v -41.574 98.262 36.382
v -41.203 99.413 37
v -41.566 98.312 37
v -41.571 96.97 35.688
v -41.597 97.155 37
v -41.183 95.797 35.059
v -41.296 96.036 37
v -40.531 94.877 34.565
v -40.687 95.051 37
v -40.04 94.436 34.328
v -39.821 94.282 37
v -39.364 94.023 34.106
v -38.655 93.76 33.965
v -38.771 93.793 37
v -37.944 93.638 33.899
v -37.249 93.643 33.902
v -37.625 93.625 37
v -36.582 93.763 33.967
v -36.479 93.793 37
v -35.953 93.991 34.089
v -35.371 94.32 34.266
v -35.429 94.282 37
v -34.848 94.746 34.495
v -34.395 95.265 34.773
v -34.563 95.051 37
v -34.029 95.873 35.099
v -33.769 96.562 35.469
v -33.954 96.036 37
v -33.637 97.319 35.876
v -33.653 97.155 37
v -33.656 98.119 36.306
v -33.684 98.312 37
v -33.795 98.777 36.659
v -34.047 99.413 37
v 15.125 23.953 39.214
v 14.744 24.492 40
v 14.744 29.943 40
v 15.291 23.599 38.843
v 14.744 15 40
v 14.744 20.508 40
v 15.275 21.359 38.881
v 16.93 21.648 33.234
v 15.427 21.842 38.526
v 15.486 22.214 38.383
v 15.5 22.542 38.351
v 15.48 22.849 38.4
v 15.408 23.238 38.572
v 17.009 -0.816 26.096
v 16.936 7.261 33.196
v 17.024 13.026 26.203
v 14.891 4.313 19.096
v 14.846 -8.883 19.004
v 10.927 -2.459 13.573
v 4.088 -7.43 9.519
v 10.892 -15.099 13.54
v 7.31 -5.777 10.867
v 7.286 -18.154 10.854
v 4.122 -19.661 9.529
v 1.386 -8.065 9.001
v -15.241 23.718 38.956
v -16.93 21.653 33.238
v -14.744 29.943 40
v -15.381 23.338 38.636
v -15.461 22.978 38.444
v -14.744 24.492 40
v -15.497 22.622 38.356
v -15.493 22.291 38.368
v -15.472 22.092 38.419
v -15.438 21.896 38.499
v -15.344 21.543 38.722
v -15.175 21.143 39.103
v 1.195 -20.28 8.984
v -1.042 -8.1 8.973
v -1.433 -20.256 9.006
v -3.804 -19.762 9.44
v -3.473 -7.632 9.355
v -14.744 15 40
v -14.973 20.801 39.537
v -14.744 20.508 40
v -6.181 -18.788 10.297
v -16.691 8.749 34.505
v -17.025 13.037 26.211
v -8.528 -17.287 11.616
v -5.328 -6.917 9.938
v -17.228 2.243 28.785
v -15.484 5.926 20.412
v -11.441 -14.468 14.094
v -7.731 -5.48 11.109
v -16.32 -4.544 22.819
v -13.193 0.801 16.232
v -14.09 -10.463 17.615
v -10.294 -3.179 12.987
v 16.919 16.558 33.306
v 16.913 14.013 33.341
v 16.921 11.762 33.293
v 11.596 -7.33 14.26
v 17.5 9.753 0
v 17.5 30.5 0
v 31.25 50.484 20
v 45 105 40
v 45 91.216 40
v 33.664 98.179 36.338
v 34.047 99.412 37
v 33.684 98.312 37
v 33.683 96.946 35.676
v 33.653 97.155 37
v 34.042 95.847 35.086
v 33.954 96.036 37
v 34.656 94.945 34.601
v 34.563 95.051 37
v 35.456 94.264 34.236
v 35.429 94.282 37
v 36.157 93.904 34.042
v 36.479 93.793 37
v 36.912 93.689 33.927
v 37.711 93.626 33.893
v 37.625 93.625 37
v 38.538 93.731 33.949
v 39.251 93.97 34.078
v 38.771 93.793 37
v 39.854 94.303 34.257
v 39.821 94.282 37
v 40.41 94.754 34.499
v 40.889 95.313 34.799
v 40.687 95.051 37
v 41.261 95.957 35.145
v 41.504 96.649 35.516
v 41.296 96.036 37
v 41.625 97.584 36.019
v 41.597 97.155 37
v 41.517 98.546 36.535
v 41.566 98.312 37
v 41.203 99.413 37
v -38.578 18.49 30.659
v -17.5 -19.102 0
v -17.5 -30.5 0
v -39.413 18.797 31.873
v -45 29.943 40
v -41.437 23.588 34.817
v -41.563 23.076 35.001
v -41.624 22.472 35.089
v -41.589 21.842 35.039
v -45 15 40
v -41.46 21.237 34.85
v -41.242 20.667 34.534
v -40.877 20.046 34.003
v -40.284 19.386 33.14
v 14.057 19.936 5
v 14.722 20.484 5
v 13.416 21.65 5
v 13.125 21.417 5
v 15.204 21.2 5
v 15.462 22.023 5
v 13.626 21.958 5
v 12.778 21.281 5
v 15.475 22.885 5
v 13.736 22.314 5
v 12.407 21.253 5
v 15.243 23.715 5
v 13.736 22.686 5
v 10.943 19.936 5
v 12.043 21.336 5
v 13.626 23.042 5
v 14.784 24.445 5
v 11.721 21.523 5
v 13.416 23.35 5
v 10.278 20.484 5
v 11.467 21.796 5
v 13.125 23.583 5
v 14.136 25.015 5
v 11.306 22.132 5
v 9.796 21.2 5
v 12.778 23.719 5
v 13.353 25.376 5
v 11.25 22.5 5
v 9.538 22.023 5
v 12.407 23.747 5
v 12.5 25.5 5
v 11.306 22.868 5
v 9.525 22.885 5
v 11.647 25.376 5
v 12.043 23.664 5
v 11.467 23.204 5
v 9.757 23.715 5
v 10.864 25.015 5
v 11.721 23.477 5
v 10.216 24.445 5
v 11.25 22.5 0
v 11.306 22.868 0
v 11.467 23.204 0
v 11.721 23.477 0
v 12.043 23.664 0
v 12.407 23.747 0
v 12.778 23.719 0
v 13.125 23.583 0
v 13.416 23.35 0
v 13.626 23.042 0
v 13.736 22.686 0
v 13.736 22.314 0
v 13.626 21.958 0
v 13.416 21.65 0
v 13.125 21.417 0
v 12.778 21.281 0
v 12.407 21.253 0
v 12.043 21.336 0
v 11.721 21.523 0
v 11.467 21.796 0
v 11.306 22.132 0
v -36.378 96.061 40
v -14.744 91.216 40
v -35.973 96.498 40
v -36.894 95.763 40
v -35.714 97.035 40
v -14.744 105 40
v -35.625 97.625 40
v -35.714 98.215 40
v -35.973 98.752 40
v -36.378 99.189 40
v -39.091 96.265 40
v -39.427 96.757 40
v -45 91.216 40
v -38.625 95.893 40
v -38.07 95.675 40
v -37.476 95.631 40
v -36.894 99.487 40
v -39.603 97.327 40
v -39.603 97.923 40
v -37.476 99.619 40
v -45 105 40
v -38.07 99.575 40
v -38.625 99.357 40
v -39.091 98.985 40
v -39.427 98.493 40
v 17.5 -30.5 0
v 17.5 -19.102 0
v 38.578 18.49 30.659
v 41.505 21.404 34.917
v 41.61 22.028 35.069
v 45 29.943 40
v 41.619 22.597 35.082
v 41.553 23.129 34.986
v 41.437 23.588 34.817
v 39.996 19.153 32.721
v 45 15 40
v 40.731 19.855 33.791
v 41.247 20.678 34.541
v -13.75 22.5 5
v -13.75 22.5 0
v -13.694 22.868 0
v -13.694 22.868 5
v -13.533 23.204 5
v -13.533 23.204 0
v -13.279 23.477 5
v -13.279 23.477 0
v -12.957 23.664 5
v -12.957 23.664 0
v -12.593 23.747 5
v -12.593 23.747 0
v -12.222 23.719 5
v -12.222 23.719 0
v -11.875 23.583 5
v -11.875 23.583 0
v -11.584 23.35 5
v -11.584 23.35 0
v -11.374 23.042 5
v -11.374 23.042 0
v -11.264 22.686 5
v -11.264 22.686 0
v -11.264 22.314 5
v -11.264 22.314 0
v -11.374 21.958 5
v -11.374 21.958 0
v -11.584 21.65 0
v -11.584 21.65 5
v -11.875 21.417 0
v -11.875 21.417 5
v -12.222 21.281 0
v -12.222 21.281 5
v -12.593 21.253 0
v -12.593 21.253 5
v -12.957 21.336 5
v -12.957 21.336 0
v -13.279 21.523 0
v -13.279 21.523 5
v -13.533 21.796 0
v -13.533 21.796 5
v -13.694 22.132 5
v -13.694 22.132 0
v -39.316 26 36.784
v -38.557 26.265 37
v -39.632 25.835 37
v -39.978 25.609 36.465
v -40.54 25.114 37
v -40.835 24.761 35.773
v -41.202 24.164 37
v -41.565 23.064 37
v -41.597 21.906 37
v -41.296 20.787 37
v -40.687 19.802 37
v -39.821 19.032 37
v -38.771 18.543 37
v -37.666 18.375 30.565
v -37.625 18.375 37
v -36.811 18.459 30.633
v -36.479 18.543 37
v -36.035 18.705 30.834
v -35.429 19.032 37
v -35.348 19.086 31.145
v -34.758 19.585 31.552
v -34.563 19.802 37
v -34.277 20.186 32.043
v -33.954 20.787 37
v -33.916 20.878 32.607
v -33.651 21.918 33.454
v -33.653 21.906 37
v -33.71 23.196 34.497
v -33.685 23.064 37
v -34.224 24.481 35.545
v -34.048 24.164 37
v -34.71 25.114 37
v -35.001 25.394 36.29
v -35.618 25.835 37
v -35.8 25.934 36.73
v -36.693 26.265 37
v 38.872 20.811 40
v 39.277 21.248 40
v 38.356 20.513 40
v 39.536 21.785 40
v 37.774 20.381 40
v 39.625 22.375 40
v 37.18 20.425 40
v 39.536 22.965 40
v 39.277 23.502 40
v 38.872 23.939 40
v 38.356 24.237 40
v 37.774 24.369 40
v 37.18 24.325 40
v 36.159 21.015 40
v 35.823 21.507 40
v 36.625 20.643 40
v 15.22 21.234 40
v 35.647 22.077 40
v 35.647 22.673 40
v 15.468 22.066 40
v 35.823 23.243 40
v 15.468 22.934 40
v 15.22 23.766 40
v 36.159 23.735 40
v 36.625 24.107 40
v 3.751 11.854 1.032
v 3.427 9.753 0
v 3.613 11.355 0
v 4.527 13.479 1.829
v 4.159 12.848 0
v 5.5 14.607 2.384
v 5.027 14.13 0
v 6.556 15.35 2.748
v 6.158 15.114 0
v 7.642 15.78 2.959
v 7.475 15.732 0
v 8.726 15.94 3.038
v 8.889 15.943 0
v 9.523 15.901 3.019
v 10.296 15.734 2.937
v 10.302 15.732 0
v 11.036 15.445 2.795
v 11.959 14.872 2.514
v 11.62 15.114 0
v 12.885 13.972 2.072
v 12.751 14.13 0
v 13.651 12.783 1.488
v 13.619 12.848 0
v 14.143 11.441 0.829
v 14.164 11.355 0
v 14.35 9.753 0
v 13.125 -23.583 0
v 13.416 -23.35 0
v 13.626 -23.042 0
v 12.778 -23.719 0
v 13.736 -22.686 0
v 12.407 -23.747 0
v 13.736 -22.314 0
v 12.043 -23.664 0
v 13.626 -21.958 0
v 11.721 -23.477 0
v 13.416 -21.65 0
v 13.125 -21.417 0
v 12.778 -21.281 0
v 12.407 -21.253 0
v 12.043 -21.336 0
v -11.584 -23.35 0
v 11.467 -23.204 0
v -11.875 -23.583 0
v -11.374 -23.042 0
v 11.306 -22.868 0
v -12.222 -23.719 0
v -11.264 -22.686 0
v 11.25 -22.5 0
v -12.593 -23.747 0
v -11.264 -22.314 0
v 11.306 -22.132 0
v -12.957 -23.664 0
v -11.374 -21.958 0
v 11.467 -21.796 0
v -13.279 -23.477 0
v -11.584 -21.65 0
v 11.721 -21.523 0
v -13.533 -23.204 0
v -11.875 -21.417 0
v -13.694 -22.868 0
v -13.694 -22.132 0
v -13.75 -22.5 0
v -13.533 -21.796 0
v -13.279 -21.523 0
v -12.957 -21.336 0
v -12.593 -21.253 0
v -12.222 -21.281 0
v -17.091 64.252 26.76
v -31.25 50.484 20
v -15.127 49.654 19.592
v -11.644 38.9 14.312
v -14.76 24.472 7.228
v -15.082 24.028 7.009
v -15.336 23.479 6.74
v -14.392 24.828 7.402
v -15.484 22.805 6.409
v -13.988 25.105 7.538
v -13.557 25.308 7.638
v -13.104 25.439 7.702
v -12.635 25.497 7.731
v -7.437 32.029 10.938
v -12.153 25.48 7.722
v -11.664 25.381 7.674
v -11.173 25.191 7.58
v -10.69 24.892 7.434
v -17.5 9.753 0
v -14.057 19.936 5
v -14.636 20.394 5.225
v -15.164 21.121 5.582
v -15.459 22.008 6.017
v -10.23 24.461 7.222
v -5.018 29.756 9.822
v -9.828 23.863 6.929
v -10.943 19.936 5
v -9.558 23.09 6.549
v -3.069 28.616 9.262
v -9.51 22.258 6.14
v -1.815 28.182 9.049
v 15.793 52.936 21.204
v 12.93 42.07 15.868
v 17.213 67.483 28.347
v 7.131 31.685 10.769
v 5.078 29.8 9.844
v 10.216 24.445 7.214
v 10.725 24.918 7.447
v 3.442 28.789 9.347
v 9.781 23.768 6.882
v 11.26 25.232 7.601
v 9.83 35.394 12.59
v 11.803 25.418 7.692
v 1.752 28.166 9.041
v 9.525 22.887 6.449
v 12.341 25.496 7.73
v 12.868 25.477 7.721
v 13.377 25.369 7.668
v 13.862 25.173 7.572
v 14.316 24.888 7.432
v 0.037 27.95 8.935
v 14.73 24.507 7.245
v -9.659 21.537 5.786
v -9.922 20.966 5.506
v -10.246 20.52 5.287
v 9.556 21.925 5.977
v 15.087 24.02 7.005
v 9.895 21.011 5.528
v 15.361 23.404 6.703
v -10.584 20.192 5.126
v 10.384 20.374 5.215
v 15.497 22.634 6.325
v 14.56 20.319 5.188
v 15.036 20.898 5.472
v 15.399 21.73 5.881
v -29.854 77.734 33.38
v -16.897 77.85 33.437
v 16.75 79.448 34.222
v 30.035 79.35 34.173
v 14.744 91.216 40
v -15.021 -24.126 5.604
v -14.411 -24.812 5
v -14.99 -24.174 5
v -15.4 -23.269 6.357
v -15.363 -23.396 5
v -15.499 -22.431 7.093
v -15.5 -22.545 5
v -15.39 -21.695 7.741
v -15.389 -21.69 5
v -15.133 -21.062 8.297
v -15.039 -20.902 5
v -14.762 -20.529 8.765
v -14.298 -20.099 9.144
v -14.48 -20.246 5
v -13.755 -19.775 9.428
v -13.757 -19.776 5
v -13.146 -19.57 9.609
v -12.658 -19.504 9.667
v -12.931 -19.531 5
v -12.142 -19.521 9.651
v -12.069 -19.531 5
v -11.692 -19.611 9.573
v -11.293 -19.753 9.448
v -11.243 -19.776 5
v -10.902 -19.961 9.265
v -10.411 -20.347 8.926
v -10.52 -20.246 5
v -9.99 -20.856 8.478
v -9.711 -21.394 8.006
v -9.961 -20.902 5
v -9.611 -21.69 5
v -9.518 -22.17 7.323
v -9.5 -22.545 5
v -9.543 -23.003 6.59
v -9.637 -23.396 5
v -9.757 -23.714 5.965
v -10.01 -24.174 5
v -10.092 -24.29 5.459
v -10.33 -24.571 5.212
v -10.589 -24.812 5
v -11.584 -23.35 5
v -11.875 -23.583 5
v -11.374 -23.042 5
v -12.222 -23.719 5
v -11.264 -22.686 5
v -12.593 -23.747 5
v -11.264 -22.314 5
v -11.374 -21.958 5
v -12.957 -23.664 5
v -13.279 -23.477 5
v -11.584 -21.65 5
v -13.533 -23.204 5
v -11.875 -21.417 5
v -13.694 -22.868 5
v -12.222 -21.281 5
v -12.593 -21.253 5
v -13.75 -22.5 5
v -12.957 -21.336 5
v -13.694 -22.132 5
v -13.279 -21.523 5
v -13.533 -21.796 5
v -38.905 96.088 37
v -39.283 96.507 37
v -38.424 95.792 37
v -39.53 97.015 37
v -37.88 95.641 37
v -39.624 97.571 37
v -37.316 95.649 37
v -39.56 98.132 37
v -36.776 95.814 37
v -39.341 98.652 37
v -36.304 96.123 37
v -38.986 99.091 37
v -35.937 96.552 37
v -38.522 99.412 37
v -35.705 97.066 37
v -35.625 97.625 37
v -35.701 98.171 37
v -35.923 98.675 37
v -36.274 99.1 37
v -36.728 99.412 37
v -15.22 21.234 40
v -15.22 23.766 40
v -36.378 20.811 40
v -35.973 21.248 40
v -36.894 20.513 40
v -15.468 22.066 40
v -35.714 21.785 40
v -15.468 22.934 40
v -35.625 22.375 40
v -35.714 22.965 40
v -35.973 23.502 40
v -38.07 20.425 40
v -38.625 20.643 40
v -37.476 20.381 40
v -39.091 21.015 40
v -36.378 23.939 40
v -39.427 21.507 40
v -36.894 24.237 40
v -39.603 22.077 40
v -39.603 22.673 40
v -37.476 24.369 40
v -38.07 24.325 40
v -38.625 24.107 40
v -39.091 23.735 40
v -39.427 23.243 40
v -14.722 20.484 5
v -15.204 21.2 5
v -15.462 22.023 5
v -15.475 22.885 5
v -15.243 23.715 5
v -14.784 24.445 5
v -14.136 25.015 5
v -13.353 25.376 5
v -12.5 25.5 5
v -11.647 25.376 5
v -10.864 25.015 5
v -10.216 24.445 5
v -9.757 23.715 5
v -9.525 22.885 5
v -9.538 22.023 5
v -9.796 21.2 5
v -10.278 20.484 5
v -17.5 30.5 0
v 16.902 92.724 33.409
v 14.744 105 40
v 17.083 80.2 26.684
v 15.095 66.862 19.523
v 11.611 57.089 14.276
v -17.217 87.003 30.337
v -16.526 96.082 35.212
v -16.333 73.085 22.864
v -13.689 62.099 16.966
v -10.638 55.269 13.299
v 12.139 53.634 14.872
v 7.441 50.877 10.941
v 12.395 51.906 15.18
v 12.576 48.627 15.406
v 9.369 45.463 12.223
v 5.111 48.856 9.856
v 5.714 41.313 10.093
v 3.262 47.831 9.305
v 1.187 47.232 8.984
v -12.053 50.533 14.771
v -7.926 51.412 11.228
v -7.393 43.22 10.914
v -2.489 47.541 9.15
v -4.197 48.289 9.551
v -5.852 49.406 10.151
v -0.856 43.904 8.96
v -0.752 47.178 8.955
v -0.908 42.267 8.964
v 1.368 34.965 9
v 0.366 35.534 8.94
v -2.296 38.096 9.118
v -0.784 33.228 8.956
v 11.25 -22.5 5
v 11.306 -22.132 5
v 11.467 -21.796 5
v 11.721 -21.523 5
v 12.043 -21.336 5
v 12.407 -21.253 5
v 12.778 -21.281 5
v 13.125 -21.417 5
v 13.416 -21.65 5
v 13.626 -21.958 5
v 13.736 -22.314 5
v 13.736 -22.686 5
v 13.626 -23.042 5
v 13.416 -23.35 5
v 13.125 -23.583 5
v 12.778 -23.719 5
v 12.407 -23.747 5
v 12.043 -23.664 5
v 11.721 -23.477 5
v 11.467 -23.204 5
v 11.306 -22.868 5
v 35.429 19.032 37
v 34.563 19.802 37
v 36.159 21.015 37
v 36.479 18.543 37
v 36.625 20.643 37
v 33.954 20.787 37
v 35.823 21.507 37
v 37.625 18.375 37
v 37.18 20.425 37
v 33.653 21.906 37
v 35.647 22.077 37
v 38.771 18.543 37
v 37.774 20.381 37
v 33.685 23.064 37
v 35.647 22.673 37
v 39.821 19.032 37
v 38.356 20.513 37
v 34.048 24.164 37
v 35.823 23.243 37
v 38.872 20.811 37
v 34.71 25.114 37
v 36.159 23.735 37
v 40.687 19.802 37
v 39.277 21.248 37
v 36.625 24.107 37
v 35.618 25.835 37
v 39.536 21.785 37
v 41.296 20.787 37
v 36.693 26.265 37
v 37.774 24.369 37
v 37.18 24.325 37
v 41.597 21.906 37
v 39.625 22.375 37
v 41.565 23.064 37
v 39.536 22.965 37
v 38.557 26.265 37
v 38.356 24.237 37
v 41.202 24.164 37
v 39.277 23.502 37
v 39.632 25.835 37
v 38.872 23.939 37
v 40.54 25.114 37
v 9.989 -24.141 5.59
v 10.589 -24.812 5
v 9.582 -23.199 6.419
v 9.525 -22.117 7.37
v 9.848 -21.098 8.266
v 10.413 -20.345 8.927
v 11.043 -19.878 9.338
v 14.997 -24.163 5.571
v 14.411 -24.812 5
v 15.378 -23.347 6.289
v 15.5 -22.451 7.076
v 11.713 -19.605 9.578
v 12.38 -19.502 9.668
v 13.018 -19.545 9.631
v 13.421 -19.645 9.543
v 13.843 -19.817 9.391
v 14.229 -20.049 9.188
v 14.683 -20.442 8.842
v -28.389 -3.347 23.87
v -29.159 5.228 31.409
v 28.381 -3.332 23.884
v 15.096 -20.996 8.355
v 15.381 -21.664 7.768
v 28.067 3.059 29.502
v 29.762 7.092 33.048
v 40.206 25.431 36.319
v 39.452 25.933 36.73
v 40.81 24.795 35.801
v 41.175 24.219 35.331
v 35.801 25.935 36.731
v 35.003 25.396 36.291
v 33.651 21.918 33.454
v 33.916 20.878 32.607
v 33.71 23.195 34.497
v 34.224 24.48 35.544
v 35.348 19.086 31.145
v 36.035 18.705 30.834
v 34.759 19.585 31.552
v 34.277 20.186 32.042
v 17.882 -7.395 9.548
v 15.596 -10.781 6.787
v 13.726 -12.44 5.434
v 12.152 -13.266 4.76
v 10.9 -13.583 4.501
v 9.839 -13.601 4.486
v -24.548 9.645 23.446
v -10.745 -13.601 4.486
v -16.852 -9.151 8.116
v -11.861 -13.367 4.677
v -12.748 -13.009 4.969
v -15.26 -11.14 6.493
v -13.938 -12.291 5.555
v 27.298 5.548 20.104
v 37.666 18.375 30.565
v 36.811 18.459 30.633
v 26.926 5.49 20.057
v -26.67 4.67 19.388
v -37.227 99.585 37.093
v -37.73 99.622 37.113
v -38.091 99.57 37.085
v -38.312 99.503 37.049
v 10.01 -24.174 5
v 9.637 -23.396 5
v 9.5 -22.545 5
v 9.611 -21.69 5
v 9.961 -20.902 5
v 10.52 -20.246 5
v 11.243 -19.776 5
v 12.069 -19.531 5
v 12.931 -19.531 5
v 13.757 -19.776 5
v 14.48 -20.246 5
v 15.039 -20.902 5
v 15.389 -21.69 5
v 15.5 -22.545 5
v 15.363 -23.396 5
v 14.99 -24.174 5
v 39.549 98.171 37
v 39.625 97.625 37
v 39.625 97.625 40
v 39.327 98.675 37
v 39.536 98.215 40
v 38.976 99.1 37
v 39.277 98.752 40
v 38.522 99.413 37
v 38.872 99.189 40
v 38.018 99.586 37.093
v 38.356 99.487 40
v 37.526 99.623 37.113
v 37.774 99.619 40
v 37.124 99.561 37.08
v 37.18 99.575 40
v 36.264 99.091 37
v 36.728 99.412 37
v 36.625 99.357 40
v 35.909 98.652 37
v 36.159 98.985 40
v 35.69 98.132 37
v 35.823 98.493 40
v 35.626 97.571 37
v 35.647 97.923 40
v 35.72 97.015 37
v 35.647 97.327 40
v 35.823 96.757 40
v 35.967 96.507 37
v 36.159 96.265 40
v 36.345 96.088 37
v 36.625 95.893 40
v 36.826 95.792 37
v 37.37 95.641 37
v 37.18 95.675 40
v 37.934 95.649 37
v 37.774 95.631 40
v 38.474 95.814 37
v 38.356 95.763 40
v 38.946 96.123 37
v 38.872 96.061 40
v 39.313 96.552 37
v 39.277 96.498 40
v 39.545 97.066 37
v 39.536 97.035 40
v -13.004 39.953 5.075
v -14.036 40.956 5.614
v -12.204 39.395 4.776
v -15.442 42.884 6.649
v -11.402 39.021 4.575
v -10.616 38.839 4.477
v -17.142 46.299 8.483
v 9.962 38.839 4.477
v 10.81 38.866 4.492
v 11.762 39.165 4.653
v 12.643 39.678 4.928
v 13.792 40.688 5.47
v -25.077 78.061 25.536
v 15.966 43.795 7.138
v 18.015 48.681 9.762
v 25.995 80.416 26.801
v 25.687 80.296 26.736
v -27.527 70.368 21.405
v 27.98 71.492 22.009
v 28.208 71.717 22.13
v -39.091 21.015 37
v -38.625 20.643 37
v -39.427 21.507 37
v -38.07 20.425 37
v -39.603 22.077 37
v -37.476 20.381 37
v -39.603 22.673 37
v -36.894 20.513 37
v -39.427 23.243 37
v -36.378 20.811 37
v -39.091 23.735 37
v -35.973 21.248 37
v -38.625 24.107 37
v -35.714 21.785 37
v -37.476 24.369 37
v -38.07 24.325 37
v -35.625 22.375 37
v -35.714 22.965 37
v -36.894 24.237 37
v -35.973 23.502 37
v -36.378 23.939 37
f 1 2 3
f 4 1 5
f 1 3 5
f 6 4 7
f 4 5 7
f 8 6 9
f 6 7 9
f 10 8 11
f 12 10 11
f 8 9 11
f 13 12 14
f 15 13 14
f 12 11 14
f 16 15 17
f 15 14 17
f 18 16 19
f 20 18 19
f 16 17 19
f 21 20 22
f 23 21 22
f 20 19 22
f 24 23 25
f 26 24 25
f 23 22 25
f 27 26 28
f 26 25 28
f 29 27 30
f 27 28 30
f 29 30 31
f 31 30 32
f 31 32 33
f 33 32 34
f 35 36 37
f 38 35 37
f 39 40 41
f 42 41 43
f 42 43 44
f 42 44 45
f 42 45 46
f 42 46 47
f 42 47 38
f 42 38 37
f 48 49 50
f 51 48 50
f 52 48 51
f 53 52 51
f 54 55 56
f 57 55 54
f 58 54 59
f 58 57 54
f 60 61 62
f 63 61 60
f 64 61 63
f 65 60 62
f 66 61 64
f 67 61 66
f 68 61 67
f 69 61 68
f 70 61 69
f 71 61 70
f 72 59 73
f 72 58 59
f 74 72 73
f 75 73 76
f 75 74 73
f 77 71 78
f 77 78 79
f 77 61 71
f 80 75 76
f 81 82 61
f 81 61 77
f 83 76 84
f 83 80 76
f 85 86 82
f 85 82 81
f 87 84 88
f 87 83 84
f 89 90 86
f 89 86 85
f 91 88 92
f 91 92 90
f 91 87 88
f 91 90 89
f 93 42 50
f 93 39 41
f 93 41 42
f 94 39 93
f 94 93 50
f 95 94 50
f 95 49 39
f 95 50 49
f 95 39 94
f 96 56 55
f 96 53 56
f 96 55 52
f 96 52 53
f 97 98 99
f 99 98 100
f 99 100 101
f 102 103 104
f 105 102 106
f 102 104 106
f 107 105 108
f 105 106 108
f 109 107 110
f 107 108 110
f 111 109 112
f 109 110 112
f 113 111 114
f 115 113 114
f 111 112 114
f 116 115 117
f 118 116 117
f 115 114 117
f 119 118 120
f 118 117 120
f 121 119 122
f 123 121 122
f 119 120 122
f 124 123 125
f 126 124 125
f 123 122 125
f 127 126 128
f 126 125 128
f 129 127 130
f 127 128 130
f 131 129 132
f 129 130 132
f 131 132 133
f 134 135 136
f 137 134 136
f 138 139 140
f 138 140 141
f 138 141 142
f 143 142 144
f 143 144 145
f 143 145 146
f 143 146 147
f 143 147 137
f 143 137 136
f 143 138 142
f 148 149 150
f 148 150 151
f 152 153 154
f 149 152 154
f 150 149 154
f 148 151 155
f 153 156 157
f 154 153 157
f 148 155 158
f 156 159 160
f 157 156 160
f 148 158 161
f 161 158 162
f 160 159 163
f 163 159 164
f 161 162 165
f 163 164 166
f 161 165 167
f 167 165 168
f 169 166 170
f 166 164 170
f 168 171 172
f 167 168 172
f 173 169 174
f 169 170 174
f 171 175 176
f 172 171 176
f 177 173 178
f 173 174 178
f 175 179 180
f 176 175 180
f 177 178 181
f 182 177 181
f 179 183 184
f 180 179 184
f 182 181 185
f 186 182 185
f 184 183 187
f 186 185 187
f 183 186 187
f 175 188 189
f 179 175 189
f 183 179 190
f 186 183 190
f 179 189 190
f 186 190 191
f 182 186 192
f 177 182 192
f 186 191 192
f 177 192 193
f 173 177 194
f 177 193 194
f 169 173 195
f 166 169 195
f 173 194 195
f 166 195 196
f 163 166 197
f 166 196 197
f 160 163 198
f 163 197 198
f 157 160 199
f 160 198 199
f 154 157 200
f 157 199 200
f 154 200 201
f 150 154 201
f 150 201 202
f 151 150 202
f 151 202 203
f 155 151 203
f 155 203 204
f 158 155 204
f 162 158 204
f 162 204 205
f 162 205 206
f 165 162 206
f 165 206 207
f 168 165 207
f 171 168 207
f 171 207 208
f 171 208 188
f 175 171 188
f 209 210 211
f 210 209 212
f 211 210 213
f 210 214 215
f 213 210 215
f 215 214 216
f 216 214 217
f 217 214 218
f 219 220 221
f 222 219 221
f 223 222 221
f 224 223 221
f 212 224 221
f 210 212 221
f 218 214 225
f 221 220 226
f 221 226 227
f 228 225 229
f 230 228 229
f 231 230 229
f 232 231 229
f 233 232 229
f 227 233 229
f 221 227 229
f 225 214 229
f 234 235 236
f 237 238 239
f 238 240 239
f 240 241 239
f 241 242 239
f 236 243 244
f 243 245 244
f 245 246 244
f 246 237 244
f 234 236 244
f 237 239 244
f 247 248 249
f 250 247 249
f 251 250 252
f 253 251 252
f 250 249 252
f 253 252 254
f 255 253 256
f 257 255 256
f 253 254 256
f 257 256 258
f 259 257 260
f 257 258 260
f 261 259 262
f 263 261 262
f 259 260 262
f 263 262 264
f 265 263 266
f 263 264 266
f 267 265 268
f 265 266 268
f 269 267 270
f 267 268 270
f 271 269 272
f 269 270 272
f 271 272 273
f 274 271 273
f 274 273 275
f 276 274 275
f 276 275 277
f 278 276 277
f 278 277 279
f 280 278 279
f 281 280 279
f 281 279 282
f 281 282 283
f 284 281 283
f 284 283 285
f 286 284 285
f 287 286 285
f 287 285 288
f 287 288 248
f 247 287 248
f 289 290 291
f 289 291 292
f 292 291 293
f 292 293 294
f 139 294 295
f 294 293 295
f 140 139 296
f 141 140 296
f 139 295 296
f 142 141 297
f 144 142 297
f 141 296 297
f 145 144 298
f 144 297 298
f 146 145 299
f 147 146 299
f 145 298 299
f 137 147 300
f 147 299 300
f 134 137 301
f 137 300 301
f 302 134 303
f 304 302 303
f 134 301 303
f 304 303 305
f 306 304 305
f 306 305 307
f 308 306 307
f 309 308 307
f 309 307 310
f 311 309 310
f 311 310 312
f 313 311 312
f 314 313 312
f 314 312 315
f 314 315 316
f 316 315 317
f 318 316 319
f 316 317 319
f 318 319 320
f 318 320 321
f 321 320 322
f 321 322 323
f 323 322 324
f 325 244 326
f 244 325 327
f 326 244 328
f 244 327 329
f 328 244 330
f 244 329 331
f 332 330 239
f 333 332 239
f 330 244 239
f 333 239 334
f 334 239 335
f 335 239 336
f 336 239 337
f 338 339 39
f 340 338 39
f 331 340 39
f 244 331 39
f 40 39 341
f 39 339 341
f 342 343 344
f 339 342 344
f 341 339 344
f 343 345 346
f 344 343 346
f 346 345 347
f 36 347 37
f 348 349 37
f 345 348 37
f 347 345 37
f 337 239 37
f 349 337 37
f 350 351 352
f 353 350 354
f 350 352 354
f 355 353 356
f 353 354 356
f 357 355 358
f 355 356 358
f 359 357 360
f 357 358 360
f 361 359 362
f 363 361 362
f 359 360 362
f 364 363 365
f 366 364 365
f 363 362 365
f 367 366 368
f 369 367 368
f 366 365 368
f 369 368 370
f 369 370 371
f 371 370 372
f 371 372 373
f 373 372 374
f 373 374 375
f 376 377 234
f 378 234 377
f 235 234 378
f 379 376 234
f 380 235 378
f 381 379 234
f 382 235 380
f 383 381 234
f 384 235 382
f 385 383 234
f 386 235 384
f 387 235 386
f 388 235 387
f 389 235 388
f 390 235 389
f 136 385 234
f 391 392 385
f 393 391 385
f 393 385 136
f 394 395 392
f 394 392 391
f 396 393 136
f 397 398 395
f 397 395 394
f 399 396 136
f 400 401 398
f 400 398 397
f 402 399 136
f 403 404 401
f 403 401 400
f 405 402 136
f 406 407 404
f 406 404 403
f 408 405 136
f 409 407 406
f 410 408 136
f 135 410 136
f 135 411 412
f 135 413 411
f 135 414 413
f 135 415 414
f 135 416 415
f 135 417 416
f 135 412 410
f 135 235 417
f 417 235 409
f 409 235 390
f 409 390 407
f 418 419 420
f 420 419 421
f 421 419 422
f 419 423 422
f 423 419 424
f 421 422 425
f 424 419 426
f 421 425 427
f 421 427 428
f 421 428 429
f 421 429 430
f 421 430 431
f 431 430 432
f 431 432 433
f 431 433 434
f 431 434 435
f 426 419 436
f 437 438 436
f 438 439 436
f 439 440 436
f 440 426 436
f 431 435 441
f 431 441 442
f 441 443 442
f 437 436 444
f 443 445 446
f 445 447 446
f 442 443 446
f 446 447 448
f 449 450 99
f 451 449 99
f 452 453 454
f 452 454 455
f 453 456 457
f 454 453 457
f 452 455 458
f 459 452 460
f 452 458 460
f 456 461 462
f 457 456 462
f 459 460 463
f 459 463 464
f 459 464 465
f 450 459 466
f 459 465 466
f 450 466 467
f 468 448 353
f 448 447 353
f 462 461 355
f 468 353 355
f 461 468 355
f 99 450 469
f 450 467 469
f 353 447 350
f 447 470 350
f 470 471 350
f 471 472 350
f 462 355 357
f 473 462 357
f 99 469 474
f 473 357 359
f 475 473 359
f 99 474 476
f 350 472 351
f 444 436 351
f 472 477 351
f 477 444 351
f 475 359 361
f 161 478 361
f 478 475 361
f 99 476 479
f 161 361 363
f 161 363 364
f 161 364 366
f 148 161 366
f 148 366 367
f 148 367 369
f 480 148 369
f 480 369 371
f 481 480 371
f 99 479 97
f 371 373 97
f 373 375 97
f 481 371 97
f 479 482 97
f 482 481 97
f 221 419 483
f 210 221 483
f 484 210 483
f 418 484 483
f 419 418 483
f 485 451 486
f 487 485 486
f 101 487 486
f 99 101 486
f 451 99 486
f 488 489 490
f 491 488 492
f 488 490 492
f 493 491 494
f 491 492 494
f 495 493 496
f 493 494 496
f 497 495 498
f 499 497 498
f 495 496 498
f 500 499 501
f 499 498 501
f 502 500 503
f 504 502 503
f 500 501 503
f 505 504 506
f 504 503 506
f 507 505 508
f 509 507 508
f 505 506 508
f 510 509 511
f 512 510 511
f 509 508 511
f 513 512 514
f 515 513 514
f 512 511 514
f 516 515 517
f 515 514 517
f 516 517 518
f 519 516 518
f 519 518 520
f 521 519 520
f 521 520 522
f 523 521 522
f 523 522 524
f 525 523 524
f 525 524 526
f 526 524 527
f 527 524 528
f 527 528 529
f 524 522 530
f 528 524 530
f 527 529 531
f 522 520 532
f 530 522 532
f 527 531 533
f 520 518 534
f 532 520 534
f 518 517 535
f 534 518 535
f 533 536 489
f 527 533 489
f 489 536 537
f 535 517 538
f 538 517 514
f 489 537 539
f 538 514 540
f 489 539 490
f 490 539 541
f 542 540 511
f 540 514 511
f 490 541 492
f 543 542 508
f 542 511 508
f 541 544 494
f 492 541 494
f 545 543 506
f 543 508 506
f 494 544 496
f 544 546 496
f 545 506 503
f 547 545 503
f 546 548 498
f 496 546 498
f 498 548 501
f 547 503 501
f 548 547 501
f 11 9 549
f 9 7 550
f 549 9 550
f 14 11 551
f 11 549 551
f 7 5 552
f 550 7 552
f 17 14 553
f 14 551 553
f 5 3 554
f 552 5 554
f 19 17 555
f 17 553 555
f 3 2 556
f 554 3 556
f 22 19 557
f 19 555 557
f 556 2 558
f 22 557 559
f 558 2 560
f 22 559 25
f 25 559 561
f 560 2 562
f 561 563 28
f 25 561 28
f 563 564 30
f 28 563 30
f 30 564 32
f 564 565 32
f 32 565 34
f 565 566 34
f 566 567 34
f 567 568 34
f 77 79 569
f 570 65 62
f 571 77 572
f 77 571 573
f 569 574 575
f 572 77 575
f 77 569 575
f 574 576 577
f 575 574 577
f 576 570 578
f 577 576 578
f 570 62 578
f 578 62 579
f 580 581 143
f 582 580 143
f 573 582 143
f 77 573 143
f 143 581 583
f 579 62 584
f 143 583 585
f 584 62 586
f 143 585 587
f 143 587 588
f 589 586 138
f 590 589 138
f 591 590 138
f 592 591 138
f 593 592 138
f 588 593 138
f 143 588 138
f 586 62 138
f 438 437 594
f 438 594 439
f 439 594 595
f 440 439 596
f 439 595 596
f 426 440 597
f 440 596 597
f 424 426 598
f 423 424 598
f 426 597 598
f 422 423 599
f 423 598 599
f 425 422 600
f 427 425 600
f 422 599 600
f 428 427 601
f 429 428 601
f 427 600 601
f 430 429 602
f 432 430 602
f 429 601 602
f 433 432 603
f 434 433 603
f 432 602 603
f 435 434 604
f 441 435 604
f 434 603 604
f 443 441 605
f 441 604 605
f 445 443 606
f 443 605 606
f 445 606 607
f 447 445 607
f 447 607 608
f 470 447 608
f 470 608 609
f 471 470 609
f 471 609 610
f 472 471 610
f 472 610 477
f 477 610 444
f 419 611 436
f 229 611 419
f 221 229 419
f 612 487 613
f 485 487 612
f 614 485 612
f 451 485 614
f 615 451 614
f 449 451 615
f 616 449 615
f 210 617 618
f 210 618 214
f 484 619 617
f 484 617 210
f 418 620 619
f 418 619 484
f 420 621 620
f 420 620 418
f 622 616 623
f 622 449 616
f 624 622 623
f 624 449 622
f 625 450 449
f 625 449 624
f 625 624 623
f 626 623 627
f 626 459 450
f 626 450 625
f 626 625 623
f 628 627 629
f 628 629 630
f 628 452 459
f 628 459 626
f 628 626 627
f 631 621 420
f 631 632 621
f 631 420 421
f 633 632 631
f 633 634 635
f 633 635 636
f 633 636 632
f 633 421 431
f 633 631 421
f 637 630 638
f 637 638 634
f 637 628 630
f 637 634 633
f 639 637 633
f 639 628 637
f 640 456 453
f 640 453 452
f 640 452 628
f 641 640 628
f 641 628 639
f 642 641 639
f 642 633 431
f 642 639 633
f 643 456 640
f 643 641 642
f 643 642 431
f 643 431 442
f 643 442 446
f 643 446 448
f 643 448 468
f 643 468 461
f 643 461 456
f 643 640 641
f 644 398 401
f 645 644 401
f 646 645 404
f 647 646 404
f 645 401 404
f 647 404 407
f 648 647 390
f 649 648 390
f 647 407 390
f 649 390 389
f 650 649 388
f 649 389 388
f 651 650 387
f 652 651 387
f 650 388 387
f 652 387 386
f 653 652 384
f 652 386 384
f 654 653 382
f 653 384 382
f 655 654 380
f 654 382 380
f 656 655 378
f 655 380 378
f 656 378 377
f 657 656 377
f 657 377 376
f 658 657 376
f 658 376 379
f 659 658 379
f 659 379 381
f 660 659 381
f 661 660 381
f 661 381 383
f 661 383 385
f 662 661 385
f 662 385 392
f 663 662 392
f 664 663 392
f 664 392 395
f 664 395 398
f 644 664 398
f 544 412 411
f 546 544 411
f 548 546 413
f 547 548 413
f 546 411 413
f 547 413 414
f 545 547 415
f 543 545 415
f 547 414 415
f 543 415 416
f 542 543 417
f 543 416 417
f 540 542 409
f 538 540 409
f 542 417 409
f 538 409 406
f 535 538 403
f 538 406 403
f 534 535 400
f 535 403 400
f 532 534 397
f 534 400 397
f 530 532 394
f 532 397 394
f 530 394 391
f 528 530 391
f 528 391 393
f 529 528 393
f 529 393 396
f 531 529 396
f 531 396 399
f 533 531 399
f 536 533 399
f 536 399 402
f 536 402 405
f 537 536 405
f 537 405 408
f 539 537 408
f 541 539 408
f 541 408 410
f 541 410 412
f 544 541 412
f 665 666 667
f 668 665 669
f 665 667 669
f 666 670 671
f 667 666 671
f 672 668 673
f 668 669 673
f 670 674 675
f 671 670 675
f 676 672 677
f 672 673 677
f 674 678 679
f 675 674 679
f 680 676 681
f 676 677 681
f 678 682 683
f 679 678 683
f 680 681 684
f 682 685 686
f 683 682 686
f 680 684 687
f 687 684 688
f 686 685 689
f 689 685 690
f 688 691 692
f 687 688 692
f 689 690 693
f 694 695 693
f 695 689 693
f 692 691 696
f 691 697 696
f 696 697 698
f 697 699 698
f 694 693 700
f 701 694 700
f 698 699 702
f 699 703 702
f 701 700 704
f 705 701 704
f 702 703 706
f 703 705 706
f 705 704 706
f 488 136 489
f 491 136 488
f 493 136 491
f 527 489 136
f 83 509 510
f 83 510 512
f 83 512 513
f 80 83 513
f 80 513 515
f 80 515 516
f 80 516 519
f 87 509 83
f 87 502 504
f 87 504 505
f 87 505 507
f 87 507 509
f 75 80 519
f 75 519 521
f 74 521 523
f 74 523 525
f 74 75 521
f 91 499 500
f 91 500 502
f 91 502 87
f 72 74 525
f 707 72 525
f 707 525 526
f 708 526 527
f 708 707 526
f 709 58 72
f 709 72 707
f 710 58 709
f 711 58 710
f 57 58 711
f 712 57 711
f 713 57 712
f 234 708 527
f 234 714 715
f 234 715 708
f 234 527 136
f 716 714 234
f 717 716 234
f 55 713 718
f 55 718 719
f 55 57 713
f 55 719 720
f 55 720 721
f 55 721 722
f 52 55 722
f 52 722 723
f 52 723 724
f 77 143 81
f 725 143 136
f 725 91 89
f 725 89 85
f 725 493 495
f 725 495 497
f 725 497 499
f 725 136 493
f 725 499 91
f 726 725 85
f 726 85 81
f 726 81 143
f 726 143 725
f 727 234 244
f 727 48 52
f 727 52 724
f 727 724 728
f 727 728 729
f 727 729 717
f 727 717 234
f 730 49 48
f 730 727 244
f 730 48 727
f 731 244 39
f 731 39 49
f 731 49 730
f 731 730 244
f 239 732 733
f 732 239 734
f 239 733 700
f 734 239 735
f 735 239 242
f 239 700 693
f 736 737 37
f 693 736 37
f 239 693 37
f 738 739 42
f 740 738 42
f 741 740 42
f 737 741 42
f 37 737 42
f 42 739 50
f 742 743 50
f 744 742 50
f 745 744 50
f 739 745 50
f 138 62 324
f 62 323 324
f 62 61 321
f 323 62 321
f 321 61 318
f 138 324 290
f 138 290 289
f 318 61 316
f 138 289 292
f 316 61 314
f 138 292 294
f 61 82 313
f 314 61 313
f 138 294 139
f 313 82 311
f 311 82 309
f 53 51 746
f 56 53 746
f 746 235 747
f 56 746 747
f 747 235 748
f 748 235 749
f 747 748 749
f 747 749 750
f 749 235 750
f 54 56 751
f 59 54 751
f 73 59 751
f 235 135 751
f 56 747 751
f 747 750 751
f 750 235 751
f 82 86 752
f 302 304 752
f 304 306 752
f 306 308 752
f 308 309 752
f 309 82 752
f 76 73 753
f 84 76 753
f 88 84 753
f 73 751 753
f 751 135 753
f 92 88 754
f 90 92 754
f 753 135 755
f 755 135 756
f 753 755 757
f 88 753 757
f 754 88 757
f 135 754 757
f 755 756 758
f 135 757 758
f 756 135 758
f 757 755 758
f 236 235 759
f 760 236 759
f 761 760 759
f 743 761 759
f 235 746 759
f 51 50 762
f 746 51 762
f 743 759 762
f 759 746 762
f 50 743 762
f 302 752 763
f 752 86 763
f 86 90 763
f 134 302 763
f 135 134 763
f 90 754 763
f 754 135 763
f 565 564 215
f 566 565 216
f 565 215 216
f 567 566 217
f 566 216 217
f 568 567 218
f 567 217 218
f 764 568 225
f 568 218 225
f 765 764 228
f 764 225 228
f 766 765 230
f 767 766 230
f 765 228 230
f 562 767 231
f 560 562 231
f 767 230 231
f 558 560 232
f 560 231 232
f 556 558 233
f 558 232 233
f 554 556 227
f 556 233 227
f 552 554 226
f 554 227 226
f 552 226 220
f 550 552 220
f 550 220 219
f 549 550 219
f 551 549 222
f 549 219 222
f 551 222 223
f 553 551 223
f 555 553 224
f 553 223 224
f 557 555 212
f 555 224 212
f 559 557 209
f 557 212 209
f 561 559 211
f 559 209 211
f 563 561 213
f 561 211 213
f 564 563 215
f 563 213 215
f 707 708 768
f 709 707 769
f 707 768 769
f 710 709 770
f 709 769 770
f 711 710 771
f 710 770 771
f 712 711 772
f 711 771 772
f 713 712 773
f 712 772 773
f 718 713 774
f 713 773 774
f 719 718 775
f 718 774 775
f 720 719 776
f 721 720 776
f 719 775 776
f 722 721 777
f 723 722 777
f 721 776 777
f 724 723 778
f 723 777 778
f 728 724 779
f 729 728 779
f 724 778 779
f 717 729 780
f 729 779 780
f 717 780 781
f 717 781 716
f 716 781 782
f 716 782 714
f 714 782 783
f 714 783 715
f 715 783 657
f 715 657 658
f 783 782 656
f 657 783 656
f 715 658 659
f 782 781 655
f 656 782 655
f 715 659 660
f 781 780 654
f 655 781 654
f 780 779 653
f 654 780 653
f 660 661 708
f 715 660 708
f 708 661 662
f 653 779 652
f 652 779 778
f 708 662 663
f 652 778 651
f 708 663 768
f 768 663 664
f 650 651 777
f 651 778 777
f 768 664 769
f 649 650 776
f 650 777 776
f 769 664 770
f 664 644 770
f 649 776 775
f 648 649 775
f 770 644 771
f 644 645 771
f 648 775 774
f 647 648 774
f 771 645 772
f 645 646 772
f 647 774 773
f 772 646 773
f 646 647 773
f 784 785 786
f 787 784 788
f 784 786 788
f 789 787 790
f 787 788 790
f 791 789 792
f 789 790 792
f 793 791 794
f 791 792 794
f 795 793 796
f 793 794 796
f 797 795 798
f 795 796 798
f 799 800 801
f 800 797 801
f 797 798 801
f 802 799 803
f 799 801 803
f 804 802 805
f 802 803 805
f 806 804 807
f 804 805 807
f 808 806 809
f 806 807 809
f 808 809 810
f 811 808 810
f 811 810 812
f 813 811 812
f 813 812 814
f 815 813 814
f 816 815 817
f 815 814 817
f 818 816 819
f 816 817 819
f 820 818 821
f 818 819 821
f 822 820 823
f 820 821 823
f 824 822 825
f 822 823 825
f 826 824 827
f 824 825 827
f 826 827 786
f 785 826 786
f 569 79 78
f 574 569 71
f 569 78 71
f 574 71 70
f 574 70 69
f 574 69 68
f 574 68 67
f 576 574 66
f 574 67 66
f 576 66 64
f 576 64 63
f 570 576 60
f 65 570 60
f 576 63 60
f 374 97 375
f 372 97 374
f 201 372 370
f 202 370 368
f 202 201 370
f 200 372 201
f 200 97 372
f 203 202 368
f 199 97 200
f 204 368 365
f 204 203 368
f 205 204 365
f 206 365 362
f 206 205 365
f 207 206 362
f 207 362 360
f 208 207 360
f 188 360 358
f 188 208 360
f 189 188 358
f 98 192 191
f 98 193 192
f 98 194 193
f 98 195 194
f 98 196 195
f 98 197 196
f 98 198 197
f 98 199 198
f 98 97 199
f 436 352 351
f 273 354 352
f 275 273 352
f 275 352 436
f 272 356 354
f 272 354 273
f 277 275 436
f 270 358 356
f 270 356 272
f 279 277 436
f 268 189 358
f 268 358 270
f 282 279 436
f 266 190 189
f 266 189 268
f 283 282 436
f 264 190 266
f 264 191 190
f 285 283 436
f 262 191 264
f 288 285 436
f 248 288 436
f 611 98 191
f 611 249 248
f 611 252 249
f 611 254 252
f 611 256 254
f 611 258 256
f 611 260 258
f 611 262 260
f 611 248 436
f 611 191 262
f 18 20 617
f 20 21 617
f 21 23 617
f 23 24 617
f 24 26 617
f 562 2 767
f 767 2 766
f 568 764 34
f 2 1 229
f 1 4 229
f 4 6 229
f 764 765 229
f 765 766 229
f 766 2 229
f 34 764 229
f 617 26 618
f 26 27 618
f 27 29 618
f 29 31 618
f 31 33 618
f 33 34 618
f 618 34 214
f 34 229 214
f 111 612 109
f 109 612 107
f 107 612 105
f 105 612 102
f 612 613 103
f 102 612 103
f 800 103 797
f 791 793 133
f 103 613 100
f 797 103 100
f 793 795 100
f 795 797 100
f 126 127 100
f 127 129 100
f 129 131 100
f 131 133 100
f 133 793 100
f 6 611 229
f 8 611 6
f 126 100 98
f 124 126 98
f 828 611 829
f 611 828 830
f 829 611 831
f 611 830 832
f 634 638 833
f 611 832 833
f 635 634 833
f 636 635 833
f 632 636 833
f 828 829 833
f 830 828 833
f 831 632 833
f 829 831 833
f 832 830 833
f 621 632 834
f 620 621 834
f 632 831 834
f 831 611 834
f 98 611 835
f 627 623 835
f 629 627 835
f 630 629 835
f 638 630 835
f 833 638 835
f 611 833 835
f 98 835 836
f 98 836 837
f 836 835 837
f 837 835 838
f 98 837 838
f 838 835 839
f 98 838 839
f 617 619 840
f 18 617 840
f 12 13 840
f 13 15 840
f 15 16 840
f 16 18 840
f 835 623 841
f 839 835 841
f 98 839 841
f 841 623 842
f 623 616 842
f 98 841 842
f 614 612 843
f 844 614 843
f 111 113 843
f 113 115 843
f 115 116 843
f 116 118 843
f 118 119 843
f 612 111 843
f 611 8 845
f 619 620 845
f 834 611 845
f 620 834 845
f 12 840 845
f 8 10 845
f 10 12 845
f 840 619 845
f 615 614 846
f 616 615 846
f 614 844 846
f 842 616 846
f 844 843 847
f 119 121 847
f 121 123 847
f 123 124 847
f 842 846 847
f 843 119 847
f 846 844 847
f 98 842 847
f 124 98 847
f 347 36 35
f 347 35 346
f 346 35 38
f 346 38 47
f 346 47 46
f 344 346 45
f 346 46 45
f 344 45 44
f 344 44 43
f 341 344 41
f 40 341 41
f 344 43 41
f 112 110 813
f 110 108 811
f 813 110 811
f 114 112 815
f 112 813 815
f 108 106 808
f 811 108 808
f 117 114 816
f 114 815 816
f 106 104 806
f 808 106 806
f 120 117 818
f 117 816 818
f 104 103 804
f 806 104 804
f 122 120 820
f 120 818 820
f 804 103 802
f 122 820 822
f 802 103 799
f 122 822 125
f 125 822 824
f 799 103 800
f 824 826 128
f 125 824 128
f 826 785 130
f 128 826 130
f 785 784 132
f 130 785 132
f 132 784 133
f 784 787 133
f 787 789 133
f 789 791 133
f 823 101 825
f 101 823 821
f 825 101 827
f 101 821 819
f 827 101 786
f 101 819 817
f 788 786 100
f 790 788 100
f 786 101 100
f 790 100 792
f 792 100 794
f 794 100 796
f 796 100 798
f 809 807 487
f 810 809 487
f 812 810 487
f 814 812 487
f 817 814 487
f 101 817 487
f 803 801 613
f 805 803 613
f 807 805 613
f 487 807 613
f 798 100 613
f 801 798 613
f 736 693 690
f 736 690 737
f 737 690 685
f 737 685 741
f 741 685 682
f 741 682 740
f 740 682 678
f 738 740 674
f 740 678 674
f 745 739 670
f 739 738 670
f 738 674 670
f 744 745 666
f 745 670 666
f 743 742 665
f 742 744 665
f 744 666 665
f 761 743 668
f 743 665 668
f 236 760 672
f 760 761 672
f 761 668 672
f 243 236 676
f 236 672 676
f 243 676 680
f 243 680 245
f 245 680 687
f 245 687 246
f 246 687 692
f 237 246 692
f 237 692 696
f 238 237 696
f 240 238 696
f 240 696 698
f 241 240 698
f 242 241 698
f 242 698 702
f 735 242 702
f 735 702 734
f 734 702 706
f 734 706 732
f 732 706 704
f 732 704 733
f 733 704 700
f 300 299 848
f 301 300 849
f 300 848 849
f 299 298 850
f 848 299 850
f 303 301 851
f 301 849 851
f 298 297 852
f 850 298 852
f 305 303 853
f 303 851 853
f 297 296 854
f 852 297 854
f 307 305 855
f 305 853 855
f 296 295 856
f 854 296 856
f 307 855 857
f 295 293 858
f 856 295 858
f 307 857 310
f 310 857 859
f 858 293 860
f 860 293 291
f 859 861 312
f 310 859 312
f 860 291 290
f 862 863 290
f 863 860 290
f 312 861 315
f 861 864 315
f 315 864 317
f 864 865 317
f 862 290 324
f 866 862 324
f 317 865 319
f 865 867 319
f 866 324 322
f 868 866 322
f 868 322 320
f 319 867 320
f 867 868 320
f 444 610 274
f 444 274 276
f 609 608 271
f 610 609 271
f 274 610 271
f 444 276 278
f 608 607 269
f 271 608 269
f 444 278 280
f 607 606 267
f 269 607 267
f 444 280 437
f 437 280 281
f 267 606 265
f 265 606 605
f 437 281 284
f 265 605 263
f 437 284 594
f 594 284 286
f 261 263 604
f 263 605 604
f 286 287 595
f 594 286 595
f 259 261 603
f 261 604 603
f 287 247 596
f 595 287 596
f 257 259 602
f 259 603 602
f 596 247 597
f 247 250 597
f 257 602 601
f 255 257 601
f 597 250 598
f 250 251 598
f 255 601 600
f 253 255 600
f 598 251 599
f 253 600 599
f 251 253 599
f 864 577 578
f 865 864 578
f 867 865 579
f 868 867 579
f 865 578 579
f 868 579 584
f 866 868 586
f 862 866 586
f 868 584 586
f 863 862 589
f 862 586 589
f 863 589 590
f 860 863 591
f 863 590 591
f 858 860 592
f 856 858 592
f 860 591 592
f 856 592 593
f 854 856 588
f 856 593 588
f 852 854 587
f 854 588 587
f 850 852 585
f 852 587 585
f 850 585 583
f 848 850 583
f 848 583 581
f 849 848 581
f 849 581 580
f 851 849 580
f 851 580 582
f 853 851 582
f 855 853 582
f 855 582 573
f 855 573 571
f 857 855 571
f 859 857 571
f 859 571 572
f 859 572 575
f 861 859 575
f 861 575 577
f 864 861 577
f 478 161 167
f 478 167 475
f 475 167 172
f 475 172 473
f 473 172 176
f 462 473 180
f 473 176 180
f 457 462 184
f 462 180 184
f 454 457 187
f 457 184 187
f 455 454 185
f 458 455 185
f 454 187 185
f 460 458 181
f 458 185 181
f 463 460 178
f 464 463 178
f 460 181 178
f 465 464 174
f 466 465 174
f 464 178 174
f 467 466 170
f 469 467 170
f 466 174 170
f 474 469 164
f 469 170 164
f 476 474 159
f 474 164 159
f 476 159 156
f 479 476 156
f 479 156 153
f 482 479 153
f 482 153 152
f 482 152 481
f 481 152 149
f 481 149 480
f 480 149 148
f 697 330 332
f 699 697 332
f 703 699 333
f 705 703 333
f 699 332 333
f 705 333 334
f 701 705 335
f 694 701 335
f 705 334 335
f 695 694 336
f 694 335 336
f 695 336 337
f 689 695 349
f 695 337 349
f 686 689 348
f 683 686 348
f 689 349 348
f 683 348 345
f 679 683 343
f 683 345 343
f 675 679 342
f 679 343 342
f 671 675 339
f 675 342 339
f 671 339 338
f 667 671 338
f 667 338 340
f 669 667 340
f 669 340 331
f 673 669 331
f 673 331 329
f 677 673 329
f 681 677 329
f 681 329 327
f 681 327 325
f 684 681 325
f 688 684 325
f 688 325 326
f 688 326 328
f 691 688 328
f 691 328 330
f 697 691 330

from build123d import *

# Parameters (mm, degrees)
SKETCH_5_R               = 1.25
CUT_EXTRUDE_1_DEPTH      = 122.037184526
CUT_EXTRUDE_START        = -5
SKETCH_6_R               = 3
CUT_EXTRUDE_2_DEPTH      = 117.037184526
SKETCH_7_R               = 2
CUT_EXTRUDE_3_DEPTH      = 122.037184526
CUT_EXTRUDE_START_2      = -3
SKETCH_8_R               = 4
CUT_EXTRUDE_4_DEPTH      = 119.037184526
CUT_EXTRUDE_5_DEPTH      = 122.037184526
CUT_EXTRUDE_5_DEPTH_BACK = 122.037184526
SKETCH_12_RX             = 20.465266771
SKETCH_12_RY             = 17.235422909
SKETCH_13_RX             = 6.190448296
SKETCH_13_RY             = 5.461738086
CUT_EXTRUDE_6_DEPTH      = 10


with BuildPart() as part:
    # Loft 1: read off the stored shape, not the designer's step
    # Loft 1: loft between two sections, ruled curve by curve
    loft_1_from = [
        Edge.make_line((-17.5, 30.5, 0), (17.5, 30.5, 0)),
        Edge.make_line((17.5, 30.5, 0), (17.5, -30.5, 0)),
        Edge.make_line((-17.5, -30.5, 0), (17.5, -30.5, 0)),
        Edge.make_line((-17.5, 30.5, 0), (-17.5, -30.5, 0)),
    ]
    loft_1_to = [
        Edge.make_line((-45, 105, 40), (45, 105, 40)),
        Edge.make_line((45, 105, 40), (45, 15, 40)),
        Edge.make_line((-45, 15, 40), (45, 15, 40)),
        Edge.make_line((-45, 105, 40), (-45, 15, 40)),
    ]
    loft_1 = Solid(Shell([*[Face.make_surface_from_curves(loft_1_from[k], loft_1_to[k]) for k in range(4)], Face(Wire(loft_1_from)), Face(Wire(loft_1_to))]))
    add(loft_1)

    # 草图5 → 切除-拉伸1 (cut, through all)
    with BuildSketch(Plane(origin=(0, 0, 0), x_dir=(-1, 0, 0), z_dir=(0, 0, -1))):
        with Locations((-12.5, 22.5)):
            Circle(SKETCH_5_R)
        with Locations((12.5, 22.5)):
            Circle(SKETCH_5_R)
        with Locations((12.5, -22.5)):
            Circle(SKETCH_5_R)
        with Locations((-12.5, -22.5)):
            Circle(SKETCH_5_R)
    extrude(amount=-CUT_EXTRUDE_1_DEPTH, mode=Mode.SUBTRACT)

    # 草图6 → 切除-拉伸2 (cut, through all)
    with BuildSketch(Plane(origin=(0, 0, 0), x_dir=(-1, 0, 0), z_dir=(0, 0, -1)).offset(CUT_EXTRUDE_START)):
        with Locations((-12.5, 22.5)):
            Circle(SKETCH_6_R)
        with Locations((12.5, 22.5)):
            Circle(SKETCH_6_R)
        with Locations((-12.5, -22.5)):
            Circle(SKETCH_6_R)
        with Locations((12.5, -22.5)):
            Circle(SKETCH_6_R)
    extrude(amount=-CUT_EXTRUDE_2_DEPTH, mode=Mode.SUBTRACT)

    # 草图7 → 切除-拉伸3 (cut, through all)
    with BuildSketch(Plane.XY.offset(40)):
        with Locations((37.625, 22.375)):
            Circle(SKETCH_7_R)
        with Locations((-37.625, 22.375)):
            Circle(SKETCH_7_R)
        with Locations((-37.625, 97.625)):
            Circle(SKETCH_7_R)
        with Locations((37.625, 97.625)):
            Circle(SKETCH_7_R)
    extrude(amount=-CUT_EXTRUDE_3_DEPTH, mode=Mode.SUBTRACT)

    # 草图8 → 切除-拉伸4 (cut, through all)
    with BuildSketch(Plane.XY.offset(40).offset(CUT_EXTRUDE_START_2)):
        with Locations((-37.625, 97.625)):
            Circle(SKETCH_8_R)
        with Locations((37.625, 97.625)):
            Circle(SKETCH_8_R)
        with Locations((37.625, 22.375)):
            Circle(SKETCH_8_R)
        with Locations((-37.625, 22.375)):
            Circle(SKETCH_8_R)
    extrude(amount=-CUT_EXTRUDE_4_DEPTH, mode=Mode.SUBTRACT)

    # 草图11 → Loft 1 2 section 0
    with BuildSketch(Plane.XY.offset(40)):
        with BuildLine():
            Line((-45, 91.216125502), (45, 91.216125502))
            Line((45, 91.216125502), (45, 29.943379718))
            Line((45, 29.943379718), (-45, 29.943379718))
            Line((-45, 29.943379718), (-45, 91.216125502))
        make_face()
    # 草图9 → Loft 1 2 section 1
    with BuildSketch(Plane(origin=(0, 0, 0), x_dir=(-1, 0, 0), z_dir=(0, 0, -1))):
        with BuildLine():
            Line((-17.5, 9.752727906), (17.5, 9.752727906))
            Line((17.5, 9.752727906), (17.5, -19.101844067))
            Line((17.5, -19.101844067), (-17.5, -19.101844067))
            Line((-17.5, -19.101844067), (-17.5, 9.752727906))
        make_face()
    loft(mode=Mode.SUBTRACT)


with BuildPart() as loft_1_2_piece_1:
    # of the separate pieces the step leaves, piece 1, a body of its own (loft_1_2_pieces)
    add(part.part.solids().sort_by_distance((-17.5, 30.5, 0))[0])


with BuildPart() as loft_1_2_piece_2:
    # of the separate pieces the step leaves, piece 2, a body of its own (loft_1_2_pieces)
    add(part.part.solids().sort_by_distance((-17.5, -19.101844067, 0))[0])


with BuildPart() as cut_extrude_5_tool:
    # 草图12 → 切除-拉伸5 (new, two sides: drawn at the far end of the back side and taken through both)
    with BuildSketch(Plane(origin=(0, 0, 0), x_dir=(1, 0, 0), z_dir=(0, 1, 0)).offset(-CUT_EXTRUDE_5_DEPTH_BACK)):
        with Locations(Location((0, -29.400447007), (0, 0, -90))):
            Ellipse(SKETCH_12_RX, SKETCH_12_RY)
    extrude(amount=CUT_EXTRUDE_5_DEPTH + CUT_EXTRUDE_5_DEPTH_BACK)


with BuildPart() as loft_1_2_piece_1_1:
    add(loft_1_2_piece_1.part)

    # 切除-拉伸5: cut by cut_extrude_5_tool
    add(cut_extrude_5_tool.part, mode=Mode.SUBTRACT)

    # 草图13 → 切除-拉伸6 (cut)
    with BuildSketch(Plane(origin=(0, 0, 0), x_dir=(-1, 0, 0), z_dir=(0, 0, -1))):
        with Locations(Location((-8.888677431, 9.752727906), (0, 0, 90))):
            Ellipse(SKETCH_13_RX, SKETCH_13_RY)
    extrude(amount=-CUT_EXTRUDE_6_DEPTH, mode=Mode.SUBTRACT)


with BuildPart() as loft_1_2_piece_2_1:
    add(loft_1_2_piece_2.part)

    # 切除-拉伸5: cut by cut_extrude_5_tool
    add(cut_extrude_5_tool.part, mode=Mode.SUBTRACT)


solid = Compound([loft_1_2_piece_1_1.part, loft_1_2_piece_2_1.part])
